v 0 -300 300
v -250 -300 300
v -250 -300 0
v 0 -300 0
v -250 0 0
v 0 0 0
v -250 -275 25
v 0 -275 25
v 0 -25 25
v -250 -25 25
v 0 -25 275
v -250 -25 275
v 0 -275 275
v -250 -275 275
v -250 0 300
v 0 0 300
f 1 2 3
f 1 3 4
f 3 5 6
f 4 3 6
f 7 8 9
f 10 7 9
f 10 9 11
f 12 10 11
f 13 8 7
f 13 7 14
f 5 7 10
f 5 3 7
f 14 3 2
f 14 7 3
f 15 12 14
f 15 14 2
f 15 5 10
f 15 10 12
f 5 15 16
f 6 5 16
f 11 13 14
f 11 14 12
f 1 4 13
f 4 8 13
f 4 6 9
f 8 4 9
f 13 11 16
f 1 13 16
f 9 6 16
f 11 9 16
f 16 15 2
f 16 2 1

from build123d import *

# Parameters (mm, degrees)
F0_W     = 250
F0_H     = 300
F1_DEPTH = 300
F2_W     = 250
F2_H     = 250
F3_DEPTH = 250.001


with BuildPart() as f1:
    # F0 (on Front) → F1 (new body)
    with BuildSketch(Plane.XZ):
        with Locations((-125, 150)):
            Rectangle(F0_W, F0_H)
    extrude(amount=F1_DEPTH)

    # F2 (on face) → F3 (cut, through all)
    with BuildSketch(Plane.YZ):
        with Locations((-150, 150)):
            Rectangle(F2_W, F2_H)
    extrude(amount=-F3_DEPTH, mode=Mode.SUBTRACT)


solid = f1.part
